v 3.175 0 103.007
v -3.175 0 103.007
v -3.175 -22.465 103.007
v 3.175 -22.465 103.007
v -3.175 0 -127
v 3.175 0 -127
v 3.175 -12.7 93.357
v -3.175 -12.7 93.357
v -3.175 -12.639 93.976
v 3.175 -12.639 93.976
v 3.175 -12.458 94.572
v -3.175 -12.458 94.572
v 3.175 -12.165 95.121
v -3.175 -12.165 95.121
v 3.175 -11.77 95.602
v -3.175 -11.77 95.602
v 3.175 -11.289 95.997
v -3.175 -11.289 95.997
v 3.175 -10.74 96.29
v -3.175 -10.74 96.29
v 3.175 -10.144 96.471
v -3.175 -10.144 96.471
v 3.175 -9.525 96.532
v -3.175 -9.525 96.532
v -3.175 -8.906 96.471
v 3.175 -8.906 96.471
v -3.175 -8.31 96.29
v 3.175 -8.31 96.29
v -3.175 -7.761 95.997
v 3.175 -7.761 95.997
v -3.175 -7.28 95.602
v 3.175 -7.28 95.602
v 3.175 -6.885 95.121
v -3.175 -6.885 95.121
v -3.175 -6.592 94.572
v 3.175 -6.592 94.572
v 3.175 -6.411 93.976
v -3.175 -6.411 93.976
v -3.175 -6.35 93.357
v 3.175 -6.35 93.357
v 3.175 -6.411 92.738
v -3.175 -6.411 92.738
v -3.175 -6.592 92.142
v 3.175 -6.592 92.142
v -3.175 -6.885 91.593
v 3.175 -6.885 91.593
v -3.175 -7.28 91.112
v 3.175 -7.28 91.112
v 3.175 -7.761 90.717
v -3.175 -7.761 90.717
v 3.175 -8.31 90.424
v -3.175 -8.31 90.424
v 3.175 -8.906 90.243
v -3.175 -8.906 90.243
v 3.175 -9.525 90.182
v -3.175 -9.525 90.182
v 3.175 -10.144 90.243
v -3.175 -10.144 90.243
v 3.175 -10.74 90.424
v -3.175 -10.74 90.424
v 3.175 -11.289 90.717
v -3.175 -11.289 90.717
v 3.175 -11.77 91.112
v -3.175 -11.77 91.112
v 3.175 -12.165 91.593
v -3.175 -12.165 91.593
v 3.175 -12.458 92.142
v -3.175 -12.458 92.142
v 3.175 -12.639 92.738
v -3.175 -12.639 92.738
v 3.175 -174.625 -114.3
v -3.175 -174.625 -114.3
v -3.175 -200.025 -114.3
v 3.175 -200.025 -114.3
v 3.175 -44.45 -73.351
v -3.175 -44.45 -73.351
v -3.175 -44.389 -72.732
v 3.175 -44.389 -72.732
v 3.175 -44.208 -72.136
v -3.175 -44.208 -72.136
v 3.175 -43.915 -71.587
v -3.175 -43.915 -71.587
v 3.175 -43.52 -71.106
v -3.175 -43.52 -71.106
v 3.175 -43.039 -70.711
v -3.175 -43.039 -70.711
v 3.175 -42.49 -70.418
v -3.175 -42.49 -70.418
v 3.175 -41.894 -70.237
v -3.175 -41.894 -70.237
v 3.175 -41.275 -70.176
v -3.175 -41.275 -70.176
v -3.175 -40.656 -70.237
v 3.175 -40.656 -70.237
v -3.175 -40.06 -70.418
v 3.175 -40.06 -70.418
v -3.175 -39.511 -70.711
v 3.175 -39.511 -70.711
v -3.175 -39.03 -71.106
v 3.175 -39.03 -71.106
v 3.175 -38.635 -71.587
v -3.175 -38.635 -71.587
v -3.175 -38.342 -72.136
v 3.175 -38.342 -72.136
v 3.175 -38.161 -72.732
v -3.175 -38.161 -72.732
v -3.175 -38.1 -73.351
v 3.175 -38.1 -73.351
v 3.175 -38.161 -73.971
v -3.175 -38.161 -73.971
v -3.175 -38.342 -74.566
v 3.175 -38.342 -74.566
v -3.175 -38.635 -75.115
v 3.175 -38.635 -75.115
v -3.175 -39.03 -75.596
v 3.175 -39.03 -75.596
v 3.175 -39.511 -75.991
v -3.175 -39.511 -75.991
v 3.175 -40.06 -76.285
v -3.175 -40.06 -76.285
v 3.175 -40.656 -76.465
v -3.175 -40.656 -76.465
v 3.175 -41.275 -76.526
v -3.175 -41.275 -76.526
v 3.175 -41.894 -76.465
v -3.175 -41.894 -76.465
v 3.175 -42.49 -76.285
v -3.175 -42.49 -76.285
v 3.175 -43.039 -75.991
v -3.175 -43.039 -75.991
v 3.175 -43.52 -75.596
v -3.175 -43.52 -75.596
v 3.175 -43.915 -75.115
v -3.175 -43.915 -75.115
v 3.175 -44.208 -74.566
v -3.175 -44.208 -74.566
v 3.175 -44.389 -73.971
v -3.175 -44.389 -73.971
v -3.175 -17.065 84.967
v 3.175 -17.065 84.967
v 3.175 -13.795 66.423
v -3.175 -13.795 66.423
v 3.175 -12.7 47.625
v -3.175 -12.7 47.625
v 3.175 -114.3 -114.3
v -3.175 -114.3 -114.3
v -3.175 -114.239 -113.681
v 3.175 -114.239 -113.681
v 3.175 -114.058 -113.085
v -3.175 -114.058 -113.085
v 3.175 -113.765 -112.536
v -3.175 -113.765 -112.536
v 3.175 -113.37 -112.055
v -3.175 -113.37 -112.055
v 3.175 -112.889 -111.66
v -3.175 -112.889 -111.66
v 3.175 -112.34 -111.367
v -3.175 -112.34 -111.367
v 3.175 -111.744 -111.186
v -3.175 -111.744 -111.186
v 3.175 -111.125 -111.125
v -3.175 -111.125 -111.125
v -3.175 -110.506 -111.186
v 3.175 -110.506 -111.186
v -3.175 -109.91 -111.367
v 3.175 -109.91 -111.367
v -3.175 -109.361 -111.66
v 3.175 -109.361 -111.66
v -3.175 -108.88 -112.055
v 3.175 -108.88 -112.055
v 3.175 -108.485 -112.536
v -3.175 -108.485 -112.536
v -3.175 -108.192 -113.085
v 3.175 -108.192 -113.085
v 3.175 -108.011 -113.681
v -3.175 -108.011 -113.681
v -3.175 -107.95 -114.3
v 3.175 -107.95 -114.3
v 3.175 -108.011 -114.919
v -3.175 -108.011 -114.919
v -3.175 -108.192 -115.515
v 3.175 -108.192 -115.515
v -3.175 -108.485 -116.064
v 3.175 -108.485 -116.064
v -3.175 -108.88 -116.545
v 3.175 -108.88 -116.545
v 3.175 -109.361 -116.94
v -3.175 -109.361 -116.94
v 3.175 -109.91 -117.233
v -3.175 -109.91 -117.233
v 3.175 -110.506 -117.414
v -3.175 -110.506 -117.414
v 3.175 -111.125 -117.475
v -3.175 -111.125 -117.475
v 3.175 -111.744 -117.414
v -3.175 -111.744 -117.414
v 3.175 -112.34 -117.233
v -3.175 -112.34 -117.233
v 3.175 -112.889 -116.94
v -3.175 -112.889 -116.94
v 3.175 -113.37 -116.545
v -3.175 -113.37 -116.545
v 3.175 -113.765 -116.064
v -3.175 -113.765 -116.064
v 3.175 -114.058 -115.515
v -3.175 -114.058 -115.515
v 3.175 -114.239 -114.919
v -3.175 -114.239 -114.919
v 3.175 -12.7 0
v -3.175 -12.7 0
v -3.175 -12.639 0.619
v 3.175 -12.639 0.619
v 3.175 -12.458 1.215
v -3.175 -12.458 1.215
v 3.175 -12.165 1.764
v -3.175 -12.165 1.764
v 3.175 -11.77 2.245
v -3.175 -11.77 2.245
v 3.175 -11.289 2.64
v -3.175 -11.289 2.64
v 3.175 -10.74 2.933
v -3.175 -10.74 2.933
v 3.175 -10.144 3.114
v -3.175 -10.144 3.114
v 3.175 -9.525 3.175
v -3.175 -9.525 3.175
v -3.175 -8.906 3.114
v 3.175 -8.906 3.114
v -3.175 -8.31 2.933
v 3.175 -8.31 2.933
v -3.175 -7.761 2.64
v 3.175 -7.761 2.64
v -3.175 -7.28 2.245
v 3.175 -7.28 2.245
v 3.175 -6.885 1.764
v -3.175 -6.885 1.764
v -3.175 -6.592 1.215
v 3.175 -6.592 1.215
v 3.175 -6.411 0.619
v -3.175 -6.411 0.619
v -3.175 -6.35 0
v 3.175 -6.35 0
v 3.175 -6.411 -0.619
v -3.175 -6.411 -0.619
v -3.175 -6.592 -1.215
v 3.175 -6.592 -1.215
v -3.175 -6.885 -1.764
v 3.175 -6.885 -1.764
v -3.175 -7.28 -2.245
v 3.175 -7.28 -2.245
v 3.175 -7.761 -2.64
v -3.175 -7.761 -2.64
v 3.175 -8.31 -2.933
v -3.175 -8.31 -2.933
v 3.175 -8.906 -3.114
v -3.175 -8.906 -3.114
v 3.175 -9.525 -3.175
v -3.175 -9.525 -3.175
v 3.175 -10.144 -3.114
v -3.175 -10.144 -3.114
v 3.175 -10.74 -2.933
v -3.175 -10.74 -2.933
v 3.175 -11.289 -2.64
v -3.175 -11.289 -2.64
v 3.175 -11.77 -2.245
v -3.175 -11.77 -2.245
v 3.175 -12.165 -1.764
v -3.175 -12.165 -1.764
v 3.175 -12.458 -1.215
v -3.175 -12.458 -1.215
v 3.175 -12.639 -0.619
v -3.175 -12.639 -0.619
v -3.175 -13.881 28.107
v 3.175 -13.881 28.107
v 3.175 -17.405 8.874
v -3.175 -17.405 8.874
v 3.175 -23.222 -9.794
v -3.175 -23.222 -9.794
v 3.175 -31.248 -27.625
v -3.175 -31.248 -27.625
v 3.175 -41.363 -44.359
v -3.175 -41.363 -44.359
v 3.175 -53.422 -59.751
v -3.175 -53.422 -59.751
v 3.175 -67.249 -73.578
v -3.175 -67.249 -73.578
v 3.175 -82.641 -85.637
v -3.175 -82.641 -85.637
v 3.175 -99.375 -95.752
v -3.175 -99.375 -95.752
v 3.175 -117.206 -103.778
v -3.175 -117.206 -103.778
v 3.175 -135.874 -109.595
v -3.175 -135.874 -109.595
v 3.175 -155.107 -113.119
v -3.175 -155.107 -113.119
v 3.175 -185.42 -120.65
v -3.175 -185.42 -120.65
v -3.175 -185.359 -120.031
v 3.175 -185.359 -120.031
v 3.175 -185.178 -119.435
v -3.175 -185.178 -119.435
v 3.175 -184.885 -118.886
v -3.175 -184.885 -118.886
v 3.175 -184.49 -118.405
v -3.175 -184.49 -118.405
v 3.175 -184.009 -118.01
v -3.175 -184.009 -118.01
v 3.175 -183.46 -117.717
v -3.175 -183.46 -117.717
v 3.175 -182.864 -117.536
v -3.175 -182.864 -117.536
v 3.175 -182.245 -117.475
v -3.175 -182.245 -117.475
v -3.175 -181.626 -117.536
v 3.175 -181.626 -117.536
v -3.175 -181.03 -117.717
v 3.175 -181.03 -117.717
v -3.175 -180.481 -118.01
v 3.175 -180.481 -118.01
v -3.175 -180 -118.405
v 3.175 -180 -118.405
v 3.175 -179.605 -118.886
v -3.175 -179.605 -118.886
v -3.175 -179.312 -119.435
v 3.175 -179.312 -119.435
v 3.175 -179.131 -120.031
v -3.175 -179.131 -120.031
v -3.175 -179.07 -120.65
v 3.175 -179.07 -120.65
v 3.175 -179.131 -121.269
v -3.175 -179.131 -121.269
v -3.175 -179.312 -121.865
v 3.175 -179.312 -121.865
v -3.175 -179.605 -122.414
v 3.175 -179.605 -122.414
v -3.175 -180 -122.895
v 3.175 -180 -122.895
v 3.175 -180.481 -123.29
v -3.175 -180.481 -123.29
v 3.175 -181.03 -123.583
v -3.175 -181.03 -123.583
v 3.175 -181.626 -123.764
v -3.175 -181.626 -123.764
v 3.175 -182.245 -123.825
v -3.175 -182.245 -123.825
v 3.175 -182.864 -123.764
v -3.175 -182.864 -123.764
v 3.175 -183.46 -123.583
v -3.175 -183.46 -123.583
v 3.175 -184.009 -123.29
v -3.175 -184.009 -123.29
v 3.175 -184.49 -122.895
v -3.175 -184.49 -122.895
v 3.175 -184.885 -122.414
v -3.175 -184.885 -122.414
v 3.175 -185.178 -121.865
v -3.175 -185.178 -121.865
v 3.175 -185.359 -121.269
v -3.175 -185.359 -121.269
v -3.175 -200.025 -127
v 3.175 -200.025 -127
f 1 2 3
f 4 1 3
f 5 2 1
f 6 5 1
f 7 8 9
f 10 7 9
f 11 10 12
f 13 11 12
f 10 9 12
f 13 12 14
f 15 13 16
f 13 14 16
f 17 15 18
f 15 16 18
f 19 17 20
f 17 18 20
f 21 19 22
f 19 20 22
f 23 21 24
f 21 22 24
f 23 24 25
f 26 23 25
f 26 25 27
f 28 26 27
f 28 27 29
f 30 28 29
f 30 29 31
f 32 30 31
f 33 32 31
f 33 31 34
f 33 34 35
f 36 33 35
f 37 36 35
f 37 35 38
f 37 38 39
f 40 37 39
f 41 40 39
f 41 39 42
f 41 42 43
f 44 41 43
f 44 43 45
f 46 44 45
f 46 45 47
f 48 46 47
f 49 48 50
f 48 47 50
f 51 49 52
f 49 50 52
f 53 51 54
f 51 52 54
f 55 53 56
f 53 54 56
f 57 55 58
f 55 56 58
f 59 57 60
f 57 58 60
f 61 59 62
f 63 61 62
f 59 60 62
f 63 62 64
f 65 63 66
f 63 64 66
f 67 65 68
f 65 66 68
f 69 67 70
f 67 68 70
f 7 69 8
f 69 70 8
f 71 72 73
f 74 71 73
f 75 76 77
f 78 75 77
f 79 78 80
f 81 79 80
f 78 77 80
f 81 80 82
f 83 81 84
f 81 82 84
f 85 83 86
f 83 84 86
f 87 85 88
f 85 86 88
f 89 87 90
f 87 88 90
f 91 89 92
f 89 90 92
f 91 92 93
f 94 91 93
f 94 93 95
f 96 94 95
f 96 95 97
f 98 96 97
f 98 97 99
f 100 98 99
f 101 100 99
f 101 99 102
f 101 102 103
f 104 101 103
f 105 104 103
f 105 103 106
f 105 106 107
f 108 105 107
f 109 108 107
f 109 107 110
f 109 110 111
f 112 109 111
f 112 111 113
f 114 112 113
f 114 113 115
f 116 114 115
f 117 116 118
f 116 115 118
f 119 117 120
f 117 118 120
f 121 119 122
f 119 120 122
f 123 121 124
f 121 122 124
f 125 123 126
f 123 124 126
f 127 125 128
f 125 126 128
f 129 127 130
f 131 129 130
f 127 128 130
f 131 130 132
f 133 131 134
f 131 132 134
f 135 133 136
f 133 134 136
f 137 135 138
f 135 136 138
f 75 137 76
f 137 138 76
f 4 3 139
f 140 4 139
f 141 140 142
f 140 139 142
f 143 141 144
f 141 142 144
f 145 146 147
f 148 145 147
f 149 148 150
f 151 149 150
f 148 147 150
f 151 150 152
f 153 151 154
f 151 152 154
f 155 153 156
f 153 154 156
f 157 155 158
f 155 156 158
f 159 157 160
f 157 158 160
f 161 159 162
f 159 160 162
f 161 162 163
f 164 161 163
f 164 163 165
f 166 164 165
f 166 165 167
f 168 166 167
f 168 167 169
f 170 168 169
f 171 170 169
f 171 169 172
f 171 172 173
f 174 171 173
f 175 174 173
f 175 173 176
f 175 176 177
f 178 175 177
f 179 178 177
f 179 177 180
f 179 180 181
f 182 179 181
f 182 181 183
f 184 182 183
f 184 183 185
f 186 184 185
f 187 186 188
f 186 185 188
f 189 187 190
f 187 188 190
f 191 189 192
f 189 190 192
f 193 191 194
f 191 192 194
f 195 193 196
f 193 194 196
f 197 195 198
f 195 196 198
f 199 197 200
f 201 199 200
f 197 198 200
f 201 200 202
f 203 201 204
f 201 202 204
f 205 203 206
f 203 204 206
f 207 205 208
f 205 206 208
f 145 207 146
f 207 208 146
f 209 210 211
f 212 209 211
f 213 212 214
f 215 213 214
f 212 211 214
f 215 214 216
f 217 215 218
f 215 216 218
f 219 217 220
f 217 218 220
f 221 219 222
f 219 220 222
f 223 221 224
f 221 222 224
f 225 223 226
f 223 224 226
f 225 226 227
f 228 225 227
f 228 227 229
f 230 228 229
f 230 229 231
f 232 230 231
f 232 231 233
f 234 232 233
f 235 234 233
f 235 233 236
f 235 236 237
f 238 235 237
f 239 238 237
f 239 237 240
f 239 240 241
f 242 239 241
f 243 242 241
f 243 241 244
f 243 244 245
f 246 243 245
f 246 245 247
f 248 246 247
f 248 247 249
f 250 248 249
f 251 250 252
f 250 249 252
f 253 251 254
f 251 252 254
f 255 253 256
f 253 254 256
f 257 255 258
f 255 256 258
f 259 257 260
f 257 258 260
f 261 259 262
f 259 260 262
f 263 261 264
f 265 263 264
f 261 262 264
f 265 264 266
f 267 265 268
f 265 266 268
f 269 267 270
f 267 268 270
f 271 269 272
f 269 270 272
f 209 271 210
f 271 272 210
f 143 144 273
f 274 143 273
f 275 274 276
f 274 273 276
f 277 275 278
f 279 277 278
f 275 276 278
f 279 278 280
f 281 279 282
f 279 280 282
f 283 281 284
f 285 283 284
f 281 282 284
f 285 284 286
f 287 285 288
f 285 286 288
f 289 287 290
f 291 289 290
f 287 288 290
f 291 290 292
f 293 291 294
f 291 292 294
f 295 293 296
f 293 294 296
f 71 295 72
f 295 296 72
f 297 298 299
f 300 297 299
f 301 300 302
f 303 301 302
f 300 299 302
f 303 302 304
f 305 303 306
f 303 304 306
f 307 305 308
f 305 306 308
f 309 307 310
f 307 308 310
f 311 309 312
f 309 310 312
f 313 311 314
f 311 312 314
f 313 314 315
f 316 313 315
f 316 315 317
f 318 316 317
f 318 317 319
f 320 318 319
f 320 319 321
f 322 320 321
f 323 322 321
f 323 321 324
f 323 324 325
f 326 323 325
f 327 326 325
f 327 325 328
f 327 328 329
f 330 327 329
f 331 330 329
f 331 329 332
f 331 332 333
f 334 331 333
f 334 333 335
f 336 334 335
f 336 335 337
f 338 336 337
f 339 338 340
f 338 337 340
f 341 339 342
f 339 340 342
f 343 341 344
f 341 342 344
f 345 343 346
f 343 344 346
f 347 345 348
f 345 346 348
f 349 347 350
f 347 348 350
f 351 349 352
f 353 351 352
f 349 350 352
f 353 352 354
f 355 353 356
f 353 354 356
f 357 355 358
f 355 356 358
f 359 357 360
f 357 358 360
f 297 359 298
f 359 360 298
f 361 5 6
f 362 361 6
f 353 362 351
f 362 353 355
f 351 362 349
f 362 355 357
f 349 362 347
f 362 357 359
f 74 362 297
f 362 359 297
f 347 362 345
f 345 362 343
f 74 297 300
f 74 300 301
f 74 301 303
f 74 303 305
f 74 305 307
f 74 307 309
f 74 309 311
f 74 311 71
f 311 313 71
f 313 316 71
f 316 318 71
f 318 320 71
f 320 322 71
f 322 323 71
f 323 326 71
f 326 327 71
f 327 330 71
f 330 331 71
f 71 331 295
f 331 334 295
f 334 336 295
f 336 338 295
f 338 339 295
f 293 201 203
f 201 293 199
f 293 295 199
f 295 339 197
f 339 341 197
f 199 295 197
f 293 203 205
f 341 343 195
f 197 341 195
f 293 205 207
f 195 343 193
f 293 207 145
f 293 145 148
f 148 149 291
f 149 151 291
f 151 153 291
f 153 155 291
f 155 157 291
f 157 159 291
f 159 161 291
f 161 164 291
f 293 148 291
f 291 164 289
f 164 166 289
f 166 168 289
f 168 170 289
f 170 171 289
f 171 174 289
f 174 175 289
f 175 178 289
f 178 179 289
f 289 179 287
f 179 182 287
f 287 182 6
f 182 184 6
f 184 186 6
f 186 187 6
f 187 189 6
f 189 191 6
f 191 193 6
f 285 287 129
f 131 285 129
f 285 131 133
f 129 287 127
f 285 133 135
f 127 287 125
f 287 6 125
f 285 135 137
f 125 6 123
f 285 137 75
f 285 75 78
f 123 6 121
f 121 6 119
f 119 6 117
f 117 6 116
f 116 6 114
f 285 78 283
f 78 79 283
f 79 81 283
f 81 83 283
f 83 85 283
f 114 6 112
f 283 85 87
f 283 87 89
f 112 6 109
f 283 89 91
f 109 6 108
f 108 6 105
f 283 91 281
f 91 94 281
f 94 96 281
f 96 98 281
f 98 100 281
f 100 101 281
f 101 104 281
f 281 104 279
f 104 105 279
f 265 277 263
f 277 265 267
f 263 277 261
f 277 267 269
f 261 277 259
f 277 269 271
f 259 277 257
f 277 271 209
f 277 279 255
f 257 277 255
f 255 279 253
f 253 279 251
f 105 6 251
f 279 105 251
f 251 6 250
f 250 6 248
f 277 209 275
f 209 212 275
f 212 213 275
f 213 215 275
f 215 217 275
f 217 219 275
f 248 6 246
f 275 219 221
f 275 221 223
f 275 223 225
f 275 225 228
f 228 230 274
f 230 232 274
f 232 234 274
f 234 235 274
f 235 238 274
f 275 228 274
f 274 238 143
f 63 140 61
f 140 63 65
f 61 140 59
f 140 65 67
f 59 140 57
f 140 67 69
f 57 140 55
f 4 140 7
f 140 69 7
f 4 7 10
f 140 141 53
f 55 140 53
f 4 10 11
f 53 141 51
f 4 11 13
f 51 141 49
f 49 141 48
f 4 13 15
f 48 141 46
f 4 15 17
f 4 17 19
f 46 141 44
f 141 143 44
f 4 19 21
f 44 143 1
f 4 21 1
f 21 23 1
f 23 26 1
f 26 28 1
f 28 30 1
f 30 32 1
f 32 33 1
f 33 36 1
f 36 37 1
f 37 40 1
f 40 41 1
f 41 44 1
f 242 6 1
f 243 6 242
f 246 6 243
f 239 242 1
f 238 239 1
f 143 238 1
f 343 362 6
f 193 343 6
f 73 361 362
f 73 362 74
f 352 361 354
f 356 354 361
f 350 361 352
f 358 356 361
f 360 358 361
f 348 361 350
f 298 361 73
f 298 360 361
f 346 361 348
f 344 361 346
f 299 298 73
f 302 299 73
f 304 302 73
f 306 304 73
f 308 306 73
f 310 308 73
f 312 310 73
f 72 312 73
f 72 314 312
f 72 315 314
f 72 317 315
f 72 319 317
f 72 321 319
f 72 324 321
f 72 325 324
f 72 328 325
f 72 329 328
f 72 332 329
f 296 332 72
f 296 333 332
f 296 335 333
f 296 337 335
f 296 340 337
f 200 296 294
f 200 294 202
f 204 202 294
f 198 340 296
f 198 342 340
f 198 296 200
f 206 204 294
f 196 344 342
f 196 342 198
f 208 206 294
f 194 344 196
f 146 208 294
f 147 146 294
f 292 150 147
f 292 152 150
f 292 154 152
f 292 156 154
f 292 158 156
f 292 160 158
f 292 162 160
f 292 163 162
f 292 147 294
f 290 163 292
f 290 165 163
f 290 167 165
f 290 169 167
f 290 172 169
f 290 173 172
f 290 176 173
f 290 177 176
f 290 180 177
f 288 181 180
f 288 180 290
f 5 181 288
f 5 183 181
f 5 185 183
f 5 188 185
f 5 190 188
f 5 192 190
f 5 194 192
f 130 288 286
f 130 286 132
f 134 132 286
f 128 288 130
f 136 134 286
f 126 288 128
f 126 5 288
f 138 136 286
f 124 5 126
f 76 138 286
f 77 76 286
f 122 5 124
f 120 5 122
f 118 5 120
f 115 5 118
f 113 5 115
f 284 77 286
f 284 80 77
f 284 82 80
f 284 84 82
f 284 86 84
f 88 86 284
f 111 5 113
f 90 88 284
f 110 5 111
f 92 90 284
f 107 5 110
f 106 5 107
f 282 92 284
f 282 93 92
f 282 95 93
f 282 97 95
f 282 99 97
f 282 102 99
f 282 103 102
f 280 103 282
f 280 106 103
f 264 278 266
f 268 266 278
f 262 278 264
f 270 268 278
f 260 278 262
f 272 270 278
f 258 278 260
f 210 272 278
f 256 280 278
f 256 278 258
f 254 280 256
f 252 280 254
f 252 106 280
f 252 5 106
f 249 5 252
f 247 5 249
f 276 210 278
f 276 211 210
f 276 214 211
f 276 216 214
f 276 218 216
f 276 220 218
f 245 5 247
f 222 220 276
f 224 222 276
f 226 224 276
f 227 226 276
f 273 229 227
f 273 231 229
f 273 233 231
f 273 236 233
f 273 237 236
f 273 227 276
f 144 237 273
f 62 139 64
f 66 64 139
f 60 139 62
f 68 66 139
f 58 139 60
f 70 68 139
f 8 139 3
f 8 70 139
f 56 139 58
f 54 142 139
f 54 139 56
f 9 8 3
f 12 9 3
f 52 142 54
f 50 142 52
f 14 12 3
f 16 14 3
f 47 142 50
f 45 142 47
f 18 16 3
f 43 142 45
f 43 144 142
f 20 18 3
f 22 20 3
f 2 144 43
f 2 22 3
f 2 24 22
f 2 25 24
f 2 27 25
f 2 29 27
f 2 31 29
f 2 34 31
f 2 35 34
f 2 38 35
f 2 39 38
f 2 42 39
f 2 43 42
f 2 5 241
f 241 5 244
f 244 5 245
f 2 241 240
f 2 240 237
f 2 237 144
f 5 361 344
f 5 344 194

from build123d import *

# Parameters (mm, degrees)
F0_W     = 6.35
F0_H     = 254
F1_DEPTH = 279.4
F3_DEPTH = 25.4
F4_W     = 79.375
F4_H     = 12.7
F5_DEPTH = 25.4
F7_D     = 6.35


with BuildPart() as f1:
    # F0 (on Front) → F1 (new body)
    with BuildSketch(Plane.XZ):
        Rectangle(F0_W, F0_H)
    extrude(amount=F1_DEPTH)

    # F2 (on face) → F3 (cut)
    with BuildSketch(Plane(origin=(-3.175, 0, 0), x_dir=(0, -1, 0), z_dir=(-1, 0, 0))):
        with BuildLine():
            Line((0, 103.006612), (22.465272, 103.006612))
            Line((22.465272, 103.006612), (174.625, 47.625))
            Line((174.625, 47.625), (12.7, 47.625))
            ThreePointArc((12.7, 47.625), (60.126734, -66.873266), (174.625, -114.3))
            Line((174.625, -114.3), (279.4, -114.3))
            Line((279.4, -114.3), (279.4, 127))
            Line((279.4, 127), (0, 127))
            Line((0, 127), (0, 103.006612))
        make_face()
        with BuildLine():
            Line((174.625, 47.625), (22.465272, 103.006612))
            ThreePointArc((22.465272, 103.006612), (15.160005, 75.742981), (12.7, 47.625))
            Line((12.7, 47.625), (174.625, 47.625))
        make_face()
    extrude(amount=-F3_DEPTH, mode=Mode.SUBTRACT)

    # F4 (on face) → F5 (cut)
    with BuildSketch(Plane(origin=(-3.175, 0, 0), x_dir=(0, -1, 0), z_dir=(-1, 0, 0))):
        with Locations((239.7125, -120.65)):
            Rectangle(F4_W, F4_H)
    extrude(amount=-F5_DEPTH, mode=Mode.SUBTRACT)

    # F7 (through all)
    with Locations(Plane.YZ.offset(3.175)):
        with Locations((-9.525, 93.357041), (-9.525, 0), (-41.275, -73.351197), (-111.125, -114.3), (-182.245, -120.65)):
            Hole(F7_D / 2)


solid = f1.part
